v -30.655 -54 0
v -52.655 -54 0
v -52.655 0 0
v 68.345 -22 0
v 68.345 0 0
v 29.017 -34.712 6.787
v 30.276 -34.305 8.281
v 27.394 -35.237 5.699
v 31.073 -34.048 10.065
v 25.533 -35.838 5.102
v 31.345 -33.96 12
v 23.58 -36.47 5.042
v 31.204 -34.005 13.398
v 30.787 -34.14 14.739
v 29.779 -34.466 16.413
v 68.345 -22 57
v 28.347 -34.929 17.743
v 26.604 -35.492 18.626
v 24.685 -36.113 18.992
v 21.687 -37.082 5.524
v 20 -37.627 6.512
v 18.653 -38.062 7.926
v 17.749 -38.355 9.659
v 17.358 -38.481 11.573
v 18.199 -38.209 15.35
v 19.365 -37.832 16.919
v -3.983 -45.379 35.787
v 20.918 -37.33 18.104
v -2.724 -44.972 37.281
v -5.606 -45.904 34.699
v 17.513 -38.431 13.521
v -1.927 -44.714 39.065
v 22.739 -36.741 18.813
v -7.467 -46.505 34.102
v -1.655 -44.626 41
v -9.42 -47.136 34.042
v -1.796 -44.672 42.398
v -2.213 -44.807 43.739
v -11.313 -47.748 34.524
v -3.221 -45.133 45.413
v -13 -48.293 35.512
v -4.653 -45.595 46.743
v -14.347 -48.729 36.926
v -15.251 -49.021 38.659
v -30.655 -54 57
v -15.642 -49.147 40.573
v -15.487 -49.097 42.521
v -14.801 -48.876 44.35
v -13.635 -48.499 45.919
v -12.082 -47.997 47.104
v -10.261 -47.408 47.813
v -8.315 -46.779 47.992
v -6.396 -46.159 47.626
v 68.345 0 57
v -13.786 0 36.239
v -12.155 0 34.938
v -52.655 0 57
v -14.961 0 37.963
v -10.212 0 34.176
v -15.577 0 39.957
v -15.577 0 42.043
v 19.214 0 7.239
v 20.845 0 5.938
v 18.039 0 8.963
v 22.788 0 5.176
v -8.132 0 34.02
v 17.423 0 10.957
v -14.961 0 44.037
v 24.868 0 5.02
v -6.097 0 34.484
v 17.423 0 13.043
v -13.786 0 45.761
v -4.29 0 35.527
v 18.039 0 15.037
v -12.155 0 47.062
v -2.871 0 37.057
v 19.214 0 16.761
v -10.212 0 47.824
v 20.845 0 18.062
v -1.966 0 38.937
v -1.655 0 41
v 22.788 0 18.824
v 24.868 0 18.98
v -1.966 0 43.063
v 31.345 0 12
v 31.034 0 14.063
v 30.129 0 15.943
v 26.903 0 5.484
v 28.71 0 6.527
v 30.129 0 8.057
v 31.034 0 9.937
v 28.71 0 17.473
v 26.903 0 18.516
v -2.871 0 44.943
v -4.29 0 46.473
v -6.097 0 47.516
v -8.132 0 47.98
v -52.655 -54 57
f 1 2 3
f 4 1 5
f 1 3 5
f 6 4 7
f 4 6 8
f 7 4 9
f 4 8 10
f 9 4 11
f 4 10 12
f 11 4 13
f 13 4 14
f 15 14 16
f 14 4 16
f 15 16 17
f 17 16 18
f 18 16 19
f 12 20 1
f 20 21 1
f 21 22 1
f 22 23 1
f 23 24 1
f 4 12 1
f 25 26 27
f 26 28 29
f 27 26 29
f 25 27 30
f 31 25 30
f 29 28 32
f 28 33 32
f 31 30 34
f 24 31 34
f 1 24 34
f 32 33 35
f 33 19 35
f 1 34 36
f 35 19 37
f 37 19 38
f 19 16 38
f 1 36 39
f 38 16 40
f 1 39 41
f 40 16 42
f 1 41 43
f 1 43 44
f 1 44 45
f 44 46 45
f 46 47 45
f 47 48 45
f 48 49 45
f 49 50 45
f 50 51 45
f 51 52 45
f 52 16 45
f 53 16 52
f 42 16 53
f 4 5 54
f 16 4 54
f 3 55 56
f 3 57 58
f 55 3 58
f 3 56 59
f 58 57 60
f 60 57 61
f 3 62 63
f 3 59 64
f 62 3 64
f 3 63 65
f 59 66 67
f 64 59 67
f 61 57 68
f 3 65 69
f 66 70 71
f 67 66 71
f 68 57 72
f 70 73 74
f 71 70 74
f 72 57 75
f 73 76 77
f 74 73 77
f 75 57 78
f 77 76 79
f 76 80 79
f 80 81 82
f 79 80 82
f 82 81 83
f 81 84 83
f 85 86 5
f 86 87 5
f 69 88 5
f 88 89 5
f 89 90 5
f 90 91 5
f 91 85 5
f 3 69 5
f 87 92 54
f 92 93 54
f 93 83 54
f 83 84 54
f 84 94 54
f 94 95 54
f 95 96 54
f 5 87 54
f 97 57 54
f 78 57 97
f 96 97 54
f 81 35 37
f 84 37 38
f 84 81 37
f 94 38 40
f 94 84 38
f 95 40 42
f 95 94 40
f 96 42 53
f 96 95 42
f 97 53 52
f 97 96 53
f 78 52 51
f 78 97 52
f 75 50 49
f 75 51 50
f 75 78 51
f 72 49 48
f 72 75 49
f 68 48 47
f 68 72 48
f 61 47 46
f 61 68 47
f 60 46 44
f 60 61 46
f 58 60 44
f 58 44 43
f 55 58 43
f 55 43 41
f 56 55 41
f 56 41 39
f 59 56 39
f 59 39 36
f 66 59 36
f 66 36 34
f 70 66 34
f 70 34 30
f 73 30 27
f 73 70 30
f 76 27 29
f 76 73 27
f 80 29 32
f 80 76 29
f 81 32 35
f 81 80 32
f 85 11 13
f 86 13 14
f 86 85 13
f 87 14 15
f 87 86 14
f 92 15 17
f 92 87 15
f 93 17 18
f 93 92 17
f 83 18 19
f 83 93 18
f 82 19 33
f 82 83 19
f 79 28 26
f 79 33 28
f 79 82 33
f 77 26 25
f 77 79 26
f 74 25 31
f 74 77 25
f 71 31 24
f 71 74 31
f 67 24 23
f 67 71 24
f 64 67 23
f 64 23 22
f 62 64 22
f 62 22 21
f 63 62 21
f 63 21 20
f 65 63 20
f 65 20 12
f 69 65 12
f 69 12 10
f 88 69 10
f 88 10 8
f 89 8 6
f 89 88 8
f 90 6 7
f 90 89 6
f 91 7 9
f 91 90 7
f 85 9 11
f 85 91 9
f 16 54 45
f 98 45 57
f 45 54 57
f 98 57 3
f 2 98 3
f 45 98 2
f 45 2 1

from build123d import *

# Parameters (mm, degrees)
F0_R     = 7
F1_DEPTH = 54
F3_DEPTH = 57.001


with BuildPart() as f1:
    # F0 (on Front) → F1 (new body)
    with BuildSketch(Plane.XZ):
        Polygon((9.345292, 57), (-52.654708, 57), (-52.654708, 46), (-30.654708, 28.847458), (6.345292, 0), (68.345292, 0), (68.345292, 11), align=None)
        with Locations((24.345292, 12)):
            Circle(F0_R, mode=Mode.SUBTRACT)
        with Locations((-8.654708, 41)):
            Circle(F0_R, mode=Mode.SUBTRACT)
        Polygon((-30.654708, 28.847458), (-52.654708, 46), (-52.654708, 0), (-30.654708, 0), align=None)
        Polygon((68.345292, 57), (9.345292, 57), (68.345292, 11), align=None)
        Polygon((6.345292, 0), (-30.654708, 28.847458), (-30.654708, 0), align=None)
    extrude(amount=F1_DEPTH)

    # F2 (on face) → F3 (cut, through all)
    with BuildSketch(Plane.XY.offset(57)):
        Polygon((68.345292, -22), (-30.654708, -54), (68.345292, -54), align=None)
    extrude(amount=-F3_DEPTH, mode=Mode.SUBTRACT)


solid = f1.part
